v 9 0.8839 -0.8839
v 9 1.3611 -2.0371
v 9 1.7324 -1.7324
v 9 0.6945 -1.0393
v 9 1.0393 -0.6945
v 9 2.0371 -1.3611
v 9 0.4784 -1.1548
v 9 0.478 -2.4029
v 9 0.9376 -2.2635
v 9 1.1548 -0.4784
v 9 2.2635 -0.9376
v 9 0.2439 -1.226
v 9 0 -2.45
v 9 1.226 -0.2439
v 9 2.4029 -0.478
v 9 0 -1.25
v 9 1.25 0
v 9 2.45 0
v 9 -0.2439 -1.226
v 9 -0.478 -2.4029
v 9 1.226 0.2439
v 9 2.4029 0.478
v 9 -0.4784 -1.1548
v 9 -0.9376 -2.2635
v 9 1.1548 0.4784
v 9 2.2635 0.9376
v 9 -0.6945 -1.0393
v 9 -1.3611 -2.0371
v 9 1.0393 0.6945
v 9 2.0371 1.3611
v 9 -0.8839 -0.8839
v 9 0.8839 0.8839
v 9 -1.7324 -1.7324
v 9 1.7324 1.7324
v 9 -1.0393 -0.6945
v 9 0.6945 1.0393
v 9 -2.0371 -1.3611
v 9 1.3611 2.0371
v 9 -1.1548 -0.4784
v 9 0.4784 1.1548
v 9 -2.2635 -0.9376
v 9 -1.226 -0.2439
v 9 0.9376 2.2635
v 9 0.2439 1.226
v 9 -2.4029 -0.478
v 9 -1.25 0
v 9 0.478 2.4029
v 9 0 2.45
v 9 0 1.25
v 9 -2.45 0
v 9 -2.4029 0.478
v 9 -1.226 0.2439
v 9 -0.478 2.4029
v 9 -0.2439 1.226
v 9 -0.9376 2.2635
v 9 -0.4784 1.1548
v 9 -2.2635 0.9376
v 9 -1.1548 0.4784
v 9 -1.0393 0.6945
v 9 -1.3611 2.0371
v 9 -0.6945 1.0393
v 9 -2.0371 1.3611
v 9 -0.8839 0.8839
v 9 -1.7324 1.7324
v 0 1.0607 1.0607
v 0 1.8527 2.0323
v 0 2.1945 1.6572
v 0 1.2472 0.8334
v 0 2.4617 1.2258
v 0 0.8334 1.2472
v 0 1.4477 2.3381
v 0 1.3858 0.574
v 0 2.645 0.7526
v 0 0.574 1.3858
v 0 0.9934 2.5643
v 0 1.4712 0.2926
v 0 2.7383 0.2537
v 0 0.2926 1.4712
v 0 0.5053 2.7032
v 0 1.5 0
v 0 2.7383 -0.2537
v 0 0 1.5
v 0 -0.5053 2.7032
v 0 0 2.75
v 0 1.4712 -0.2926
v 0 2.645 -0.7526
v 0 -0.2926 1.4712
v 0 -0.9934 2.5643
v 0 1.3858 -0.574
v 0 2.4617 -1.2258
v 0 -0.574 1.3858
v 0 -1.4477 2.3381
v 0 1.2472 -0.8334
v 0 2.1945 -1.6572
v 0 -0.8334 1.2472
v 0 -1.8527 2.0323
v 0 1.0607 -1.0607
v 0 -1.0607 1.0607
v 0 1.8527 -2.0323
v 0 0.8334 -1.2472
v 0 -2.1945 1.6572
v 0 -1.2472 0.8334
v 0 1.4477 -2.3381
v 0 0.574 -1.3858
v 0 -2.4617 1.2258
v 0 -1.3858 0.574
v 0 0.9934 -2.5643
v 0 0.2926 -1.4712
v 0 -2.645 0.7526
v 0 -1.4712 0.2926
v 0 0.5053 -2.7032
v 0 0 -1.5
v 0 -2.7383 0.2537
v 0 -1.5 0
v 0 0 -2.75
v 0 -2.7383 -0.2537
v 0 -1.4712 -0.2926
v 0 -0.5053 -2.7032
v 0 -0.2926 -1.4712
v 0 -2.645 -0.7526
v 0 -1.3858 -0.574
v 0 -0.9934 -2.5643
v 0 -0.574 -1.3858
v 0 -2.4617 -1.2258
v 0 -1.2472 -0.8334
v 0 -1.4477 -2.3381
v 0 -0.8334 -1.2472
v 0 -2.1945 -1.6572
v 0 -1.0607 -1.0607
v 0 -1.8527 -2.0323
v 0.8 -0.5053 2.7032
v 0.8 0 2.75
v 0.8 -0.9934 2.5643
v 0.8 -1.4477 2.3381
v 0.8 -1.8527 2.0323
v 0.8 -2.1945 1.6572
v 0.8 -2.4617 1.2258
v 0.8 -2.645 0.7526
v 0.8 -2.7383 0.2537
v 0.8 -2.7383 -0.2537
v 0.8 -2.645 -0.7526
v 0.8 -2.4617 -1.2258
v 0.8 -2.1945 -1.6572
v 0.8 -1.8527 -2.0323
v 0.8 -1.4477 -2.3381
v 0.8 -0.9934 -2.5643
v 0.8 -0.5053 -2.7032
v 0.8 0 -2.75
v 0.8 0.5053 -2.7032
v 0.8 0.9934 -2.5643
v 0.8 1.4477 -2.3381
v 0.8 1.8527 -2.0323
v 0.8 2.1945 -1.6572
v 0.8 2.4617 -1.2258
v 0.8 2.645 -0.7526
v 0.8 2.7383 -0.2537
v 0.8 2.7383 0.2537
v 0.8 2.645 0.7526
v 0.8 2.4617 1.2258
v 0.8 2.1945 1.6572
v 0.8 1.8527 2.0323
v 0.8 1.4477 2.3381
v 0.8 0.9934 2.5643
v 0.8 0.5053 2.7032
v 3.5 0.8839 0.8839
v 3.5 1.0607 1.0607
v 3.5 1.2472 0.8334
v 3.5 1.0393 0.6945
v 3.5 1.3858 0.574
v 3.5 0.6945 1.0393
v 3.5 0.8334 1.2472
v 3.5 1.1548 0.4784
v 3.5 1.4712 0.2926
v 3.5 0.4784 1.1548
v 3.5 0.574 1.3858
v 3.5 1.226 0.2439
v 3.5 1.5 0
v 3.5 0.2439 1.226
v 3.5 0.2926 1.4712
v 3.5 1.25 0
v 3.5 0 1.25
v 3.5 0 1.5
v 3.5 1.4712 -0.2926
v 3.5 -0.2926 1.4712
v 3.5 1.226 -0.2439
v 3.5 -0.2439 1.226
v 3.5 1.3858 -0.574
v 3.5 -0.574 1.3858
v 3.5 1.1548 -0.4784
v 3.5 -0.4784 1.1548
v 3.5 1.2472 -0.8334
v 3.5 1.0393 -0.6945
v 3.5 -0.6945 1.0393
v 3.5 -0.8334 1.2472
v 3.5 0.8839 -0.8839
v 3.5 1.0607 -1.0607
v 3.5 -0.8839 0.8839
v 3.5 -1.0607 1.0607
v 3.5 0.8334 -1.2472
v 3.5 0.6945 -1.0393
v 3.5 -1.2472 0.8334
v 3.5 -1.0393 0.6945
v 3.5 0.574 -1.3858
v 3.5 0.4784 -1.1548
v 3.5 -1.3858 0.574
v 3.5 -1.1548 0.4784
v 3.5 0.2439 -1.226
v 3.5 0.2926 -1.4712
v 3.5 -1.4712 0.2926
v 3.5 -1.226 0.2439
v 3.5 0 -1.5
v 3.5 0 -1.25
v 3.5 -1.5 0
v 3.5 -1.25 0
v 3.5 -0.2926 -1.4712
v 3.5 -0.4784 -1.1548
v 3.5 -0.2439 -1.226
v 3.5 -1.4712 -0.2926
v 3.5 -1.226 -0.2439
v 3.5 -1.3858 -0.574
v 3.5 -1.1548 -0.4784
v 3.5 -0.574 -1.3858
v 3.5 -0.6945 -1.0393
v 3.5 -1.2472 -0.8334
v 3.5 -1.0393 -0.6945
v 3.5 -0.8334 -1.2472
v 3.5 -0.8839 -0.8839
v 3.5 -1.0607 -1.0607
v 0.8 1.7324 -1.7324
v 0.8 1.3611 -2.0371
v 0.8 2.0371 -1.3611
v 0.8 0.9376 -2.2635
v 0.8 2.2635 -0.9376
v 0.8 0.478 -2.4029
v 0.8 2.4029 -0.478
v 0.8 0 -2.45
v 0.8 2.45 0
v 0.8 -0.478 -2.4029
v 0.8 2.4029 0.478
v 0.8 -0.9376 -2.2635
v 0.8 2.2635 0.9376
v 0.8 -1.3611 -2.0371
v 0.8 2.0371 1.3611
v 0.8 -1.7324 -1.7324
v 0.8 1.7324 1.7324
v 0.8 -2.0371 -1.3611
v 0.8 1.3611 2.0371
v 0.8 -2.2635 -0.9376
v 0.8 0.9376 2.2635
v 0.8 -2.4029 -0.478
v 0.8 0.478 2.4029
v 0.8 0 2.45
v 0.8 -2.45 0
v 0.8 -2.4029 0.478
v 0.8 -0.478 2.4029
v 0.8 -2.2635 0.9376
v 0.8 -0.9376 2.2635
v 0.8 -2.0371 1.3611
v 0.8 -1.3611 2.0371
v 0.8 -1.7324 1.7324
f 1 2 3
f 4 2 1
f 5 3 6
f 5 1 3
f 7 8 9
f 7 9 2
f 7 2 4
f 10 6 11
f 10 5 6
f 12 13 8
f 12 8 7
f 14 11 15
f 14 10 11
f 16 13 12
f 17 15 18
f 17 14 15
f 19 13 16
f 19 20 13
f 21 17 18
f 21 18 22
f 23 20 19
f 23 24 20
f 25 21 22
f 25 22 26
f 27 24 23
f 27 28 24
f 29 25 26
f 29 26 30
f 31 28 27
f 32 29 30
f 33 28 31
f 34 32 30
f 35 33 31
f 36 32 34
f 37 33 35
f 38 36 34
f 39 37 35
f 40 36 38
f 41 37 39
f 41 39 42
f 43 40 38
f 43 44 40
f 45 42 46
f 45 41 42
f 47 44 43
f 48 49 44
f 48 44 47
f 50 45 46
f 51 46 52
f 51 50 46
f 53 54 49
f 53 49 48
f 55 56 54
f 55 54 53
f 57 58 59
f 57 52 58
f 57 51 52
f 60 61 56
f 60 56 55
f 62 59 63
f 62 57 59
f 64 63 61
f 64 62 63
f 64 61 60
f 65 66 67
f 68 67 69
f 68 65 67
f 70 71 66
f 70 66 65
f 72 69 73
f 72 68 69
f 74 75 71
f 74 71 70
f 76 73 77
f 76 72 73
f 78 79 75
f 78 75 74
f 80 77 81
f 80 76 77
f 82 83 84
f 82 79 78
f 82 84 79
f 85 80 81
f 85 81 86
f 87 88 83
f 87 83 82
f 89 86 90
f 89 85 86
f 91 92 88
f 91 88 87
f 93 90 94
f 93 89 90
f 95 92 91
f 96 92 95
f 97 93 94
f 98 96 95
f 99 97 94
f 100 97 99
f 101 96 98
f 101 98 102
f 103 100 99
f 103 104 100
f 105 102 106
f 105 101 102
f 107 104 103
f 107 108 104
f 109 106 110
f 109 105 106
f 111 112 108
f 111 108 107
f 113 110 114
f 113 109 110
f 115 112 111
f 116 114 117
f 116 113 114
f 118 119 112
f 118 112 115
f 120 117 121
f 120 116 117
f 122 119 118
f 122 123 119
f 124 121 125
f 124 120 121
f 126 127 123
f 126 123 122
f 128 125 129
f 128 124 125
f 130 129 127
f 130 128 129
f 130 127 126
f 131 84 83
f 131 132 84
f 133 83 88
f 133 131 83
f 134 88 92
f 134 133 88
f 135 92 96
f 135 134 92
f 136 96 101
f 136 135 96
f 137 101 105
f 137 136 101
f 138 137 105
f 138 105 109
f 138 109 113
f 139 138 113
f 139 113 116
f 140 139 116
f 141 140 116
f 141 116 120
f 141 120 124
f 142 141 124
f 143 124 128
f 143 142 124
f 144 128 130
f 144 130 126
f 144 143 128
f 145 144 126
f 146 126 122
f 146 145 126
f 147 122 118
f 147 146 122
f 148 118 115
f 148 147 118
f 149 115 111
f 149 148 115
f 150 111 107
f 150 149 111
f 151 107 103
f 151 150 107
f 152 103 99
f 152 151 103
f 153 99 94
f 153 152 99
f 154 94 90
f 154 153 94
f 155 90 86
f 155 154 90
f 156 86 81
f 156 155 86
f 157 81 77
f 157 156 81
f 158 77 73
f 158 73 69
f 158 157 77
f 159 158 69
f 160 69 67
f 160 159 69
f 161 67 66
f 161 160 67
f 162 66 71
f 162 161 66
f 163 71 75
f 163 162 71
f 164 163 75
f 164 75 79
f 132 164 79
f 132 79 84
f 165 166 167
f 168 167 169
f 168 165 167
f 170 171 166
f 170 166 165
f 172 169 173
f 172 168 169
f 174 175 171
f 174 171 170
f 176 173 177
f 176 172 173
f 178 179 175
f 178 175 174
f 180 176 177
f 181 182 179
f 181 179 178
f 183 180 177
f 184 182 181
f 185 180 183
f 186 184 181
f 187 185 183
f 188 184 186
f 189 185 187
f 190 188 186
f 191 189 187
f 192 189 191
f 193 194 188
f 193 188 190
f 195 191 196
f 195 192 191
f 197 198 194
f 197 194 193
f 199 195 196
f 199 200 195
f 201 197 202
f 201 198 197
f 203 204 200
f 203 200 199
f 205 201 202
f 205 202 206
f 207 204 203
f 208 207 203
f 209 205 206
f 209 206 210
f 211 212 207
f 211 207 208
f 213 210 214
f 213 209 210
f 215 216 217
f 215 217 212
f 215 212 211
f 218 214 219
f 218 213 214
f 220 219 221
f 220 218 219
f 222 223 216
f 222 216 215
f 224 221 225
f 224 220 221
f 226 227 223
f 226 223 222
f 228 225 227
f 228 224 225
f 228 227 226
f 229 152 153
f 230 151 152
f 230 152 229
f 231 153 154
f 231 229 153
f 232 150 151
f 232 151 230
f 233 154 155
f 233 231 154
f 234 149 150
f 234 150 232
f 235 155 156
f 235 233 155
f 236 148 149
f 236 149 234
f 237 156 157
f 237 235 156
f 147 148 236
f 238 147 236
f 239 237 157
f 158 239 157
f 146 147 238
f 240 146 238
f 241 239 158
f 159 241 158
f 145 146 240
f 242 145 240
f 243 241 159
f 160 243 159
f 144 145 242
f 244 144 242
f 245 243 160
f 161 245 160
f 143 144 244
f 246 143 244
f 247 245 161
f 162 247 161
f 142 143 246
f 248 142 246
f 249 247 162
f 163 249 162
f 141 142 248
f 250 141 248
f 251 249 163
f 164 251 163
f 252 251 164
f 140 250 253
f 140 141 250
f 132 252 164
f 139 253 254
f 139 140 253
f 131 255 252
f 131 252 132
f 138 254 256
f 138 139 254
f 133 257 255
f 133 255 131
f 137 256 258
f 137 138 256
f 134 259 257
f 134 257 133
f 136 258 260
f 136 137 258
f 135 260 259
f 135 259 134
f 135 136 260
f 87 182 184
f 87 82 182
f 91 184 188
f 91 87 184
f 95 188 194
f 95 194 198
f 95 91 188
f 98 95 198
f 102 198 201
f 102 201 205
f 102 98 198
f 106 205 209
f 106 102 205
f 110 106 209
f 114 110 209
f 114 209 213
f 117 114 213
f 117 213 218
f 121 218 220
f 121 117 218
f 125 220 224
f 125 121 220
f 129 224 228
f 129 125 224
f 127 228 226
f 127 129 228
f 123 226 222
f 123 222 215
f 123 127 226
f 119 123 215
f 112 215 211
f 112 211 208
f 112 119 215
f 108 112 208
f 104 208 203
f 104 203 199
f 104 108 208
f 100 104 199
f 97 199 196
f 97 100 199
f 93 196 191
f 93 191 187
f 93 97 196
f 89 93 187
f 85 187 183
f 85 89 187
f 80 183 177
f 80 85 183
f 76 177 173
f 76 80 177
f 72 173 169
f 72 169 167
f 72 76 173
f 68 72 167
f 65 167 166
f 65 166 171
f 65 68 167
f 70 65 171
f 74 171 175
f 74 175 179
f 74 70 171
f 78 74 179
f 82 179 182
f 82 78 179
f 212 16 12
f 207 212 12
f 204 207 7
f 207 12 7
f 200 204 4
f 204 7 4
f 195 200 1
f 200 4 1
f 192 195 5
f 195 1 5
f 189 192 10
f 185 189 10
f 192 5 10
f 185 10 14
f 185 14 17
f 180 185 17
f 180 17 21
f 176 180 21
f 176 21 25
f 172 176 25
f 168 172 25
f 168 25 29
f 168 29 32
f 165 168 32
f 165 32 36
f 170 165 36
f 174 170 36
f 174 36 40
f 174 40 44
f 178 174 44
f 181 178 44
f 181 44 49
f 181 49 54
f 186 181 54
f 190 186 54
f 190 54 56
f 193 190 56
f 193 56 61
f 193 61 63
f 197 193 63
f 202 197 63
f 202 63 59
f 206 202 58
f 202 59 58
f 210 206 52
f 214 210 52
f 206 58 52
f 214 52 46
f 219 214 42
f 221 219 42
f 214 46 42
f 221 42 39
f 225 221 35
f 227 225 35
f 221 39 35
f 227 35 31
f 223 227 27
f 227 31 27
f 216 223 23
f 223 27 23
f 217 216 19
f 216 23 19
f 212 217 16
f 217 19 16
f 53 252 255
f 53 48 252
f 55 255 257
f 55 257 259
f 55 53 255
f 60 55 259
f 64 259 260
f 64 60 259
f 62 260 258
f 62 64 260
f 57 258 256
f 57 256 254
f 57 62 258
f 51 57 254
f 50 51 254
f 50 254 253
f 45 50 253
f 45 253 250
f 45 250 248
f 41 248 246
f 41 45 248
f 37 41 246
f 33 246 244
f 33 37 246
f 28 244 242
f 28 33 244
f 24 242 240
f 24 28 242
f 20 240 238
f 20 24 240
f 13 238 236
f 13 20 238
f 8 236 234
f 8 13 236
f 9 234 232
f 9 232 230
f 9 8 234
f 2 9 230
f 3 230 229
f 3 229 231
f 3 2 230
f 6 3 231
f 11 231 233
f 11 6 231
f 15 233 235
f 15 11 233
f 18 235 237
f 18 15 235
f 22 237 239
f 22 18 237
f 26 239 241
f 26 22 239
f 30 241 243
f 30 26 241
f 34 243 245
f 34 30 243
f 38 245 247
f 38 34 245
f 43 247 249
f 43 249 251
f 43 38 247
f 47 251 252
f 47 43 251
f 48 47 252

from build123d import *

# Parameters (mm, degrees)
HOLE_WIZARD_M3_1_D = 2.5


with BuildPart() as part:
    # 草图1 → 旋转1 (revolve)
    with BuildSketch(Plane.XY, mode=Mode.PRIVATE) as revolve_1_sk:
        Polygon((0, 1.5), (0, 2.75), (0.8, 2.75), (0.8, 2.45), (9, 2.45), (9, 0), (3.5, 0), (3.5, 1.5), align=None)
    revolve(revolve_1_sk.sketch.rotate(Axis((0, 0, 0), (1, 0, 0)), 90), axis=Axis((0, 0, 0), (1, 0, 0)))

    # M3 螺纹孔1 (through all)
    with Locations(Plane.ZY.offset(-3.5)):
        with Locations((0, 0)):
            Hole(HOLE_WIZARD_M3_1_D / 2)


solid = part.part
